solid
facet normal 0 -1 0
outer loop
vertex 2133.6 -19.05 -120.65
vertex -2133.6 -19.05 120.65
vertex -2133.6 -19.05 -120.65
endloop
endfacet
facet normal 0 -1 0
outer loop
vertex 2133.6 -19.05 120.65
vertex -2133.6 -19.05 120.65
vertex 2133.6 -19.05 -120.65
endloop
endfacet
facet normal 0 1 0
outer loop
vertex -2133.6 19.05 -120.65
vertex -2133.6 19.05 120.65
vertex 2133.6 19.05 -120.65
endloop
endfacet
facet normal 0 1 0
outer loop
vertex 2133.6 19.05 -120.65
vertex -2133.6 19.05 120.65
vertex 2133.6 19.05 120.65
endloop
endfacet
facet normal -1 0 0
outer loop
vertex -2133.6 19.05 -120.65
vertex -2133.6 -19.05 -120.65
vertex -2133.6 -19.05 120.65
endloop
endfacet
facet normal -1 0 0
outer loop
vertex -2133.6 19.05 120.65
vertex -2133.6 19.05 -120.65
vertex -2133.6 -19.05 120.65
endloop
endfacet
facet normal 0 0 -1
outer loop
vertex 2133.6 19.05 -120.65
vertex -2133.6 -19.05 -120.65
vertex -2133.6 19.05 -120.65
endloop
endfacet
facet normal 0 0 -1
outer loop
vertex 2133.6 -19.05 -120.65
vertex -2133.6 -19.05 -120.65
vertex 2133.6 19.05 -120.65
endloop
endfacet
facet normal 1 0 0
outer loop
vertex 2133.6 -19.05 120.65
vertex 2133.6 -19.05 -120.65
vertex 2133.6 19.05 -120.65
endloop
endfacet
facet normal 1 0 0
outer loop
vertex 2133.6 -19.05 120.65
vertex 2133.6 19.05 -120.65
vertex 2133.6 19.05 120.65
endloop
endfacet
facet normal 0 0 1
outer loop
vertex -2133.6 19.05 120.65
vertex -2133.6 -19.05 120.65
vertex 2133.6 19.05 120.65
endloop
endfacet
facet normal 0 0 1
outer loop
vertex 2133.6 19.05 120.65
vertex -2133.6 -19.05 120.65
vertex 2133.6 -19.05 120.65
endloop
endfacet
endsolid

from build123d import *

# Parameters (mm, degrees)
F0_W     = 4267.2
F0_H     = 241.3
F1_DEPTH = 19.05


with BuildPart() as f1:
    # F0 (on Front) → F1 (new body, symmetric)
    with BuildSketch(Plane.XZ):
        Rectangle(F0_W, F0_H)
    extrude(amount=F1_DEPTH, both=True)


with BuildPart() as f2_1:
    # F2: copy of F1
    add(f1.part)


solid = f1.part
